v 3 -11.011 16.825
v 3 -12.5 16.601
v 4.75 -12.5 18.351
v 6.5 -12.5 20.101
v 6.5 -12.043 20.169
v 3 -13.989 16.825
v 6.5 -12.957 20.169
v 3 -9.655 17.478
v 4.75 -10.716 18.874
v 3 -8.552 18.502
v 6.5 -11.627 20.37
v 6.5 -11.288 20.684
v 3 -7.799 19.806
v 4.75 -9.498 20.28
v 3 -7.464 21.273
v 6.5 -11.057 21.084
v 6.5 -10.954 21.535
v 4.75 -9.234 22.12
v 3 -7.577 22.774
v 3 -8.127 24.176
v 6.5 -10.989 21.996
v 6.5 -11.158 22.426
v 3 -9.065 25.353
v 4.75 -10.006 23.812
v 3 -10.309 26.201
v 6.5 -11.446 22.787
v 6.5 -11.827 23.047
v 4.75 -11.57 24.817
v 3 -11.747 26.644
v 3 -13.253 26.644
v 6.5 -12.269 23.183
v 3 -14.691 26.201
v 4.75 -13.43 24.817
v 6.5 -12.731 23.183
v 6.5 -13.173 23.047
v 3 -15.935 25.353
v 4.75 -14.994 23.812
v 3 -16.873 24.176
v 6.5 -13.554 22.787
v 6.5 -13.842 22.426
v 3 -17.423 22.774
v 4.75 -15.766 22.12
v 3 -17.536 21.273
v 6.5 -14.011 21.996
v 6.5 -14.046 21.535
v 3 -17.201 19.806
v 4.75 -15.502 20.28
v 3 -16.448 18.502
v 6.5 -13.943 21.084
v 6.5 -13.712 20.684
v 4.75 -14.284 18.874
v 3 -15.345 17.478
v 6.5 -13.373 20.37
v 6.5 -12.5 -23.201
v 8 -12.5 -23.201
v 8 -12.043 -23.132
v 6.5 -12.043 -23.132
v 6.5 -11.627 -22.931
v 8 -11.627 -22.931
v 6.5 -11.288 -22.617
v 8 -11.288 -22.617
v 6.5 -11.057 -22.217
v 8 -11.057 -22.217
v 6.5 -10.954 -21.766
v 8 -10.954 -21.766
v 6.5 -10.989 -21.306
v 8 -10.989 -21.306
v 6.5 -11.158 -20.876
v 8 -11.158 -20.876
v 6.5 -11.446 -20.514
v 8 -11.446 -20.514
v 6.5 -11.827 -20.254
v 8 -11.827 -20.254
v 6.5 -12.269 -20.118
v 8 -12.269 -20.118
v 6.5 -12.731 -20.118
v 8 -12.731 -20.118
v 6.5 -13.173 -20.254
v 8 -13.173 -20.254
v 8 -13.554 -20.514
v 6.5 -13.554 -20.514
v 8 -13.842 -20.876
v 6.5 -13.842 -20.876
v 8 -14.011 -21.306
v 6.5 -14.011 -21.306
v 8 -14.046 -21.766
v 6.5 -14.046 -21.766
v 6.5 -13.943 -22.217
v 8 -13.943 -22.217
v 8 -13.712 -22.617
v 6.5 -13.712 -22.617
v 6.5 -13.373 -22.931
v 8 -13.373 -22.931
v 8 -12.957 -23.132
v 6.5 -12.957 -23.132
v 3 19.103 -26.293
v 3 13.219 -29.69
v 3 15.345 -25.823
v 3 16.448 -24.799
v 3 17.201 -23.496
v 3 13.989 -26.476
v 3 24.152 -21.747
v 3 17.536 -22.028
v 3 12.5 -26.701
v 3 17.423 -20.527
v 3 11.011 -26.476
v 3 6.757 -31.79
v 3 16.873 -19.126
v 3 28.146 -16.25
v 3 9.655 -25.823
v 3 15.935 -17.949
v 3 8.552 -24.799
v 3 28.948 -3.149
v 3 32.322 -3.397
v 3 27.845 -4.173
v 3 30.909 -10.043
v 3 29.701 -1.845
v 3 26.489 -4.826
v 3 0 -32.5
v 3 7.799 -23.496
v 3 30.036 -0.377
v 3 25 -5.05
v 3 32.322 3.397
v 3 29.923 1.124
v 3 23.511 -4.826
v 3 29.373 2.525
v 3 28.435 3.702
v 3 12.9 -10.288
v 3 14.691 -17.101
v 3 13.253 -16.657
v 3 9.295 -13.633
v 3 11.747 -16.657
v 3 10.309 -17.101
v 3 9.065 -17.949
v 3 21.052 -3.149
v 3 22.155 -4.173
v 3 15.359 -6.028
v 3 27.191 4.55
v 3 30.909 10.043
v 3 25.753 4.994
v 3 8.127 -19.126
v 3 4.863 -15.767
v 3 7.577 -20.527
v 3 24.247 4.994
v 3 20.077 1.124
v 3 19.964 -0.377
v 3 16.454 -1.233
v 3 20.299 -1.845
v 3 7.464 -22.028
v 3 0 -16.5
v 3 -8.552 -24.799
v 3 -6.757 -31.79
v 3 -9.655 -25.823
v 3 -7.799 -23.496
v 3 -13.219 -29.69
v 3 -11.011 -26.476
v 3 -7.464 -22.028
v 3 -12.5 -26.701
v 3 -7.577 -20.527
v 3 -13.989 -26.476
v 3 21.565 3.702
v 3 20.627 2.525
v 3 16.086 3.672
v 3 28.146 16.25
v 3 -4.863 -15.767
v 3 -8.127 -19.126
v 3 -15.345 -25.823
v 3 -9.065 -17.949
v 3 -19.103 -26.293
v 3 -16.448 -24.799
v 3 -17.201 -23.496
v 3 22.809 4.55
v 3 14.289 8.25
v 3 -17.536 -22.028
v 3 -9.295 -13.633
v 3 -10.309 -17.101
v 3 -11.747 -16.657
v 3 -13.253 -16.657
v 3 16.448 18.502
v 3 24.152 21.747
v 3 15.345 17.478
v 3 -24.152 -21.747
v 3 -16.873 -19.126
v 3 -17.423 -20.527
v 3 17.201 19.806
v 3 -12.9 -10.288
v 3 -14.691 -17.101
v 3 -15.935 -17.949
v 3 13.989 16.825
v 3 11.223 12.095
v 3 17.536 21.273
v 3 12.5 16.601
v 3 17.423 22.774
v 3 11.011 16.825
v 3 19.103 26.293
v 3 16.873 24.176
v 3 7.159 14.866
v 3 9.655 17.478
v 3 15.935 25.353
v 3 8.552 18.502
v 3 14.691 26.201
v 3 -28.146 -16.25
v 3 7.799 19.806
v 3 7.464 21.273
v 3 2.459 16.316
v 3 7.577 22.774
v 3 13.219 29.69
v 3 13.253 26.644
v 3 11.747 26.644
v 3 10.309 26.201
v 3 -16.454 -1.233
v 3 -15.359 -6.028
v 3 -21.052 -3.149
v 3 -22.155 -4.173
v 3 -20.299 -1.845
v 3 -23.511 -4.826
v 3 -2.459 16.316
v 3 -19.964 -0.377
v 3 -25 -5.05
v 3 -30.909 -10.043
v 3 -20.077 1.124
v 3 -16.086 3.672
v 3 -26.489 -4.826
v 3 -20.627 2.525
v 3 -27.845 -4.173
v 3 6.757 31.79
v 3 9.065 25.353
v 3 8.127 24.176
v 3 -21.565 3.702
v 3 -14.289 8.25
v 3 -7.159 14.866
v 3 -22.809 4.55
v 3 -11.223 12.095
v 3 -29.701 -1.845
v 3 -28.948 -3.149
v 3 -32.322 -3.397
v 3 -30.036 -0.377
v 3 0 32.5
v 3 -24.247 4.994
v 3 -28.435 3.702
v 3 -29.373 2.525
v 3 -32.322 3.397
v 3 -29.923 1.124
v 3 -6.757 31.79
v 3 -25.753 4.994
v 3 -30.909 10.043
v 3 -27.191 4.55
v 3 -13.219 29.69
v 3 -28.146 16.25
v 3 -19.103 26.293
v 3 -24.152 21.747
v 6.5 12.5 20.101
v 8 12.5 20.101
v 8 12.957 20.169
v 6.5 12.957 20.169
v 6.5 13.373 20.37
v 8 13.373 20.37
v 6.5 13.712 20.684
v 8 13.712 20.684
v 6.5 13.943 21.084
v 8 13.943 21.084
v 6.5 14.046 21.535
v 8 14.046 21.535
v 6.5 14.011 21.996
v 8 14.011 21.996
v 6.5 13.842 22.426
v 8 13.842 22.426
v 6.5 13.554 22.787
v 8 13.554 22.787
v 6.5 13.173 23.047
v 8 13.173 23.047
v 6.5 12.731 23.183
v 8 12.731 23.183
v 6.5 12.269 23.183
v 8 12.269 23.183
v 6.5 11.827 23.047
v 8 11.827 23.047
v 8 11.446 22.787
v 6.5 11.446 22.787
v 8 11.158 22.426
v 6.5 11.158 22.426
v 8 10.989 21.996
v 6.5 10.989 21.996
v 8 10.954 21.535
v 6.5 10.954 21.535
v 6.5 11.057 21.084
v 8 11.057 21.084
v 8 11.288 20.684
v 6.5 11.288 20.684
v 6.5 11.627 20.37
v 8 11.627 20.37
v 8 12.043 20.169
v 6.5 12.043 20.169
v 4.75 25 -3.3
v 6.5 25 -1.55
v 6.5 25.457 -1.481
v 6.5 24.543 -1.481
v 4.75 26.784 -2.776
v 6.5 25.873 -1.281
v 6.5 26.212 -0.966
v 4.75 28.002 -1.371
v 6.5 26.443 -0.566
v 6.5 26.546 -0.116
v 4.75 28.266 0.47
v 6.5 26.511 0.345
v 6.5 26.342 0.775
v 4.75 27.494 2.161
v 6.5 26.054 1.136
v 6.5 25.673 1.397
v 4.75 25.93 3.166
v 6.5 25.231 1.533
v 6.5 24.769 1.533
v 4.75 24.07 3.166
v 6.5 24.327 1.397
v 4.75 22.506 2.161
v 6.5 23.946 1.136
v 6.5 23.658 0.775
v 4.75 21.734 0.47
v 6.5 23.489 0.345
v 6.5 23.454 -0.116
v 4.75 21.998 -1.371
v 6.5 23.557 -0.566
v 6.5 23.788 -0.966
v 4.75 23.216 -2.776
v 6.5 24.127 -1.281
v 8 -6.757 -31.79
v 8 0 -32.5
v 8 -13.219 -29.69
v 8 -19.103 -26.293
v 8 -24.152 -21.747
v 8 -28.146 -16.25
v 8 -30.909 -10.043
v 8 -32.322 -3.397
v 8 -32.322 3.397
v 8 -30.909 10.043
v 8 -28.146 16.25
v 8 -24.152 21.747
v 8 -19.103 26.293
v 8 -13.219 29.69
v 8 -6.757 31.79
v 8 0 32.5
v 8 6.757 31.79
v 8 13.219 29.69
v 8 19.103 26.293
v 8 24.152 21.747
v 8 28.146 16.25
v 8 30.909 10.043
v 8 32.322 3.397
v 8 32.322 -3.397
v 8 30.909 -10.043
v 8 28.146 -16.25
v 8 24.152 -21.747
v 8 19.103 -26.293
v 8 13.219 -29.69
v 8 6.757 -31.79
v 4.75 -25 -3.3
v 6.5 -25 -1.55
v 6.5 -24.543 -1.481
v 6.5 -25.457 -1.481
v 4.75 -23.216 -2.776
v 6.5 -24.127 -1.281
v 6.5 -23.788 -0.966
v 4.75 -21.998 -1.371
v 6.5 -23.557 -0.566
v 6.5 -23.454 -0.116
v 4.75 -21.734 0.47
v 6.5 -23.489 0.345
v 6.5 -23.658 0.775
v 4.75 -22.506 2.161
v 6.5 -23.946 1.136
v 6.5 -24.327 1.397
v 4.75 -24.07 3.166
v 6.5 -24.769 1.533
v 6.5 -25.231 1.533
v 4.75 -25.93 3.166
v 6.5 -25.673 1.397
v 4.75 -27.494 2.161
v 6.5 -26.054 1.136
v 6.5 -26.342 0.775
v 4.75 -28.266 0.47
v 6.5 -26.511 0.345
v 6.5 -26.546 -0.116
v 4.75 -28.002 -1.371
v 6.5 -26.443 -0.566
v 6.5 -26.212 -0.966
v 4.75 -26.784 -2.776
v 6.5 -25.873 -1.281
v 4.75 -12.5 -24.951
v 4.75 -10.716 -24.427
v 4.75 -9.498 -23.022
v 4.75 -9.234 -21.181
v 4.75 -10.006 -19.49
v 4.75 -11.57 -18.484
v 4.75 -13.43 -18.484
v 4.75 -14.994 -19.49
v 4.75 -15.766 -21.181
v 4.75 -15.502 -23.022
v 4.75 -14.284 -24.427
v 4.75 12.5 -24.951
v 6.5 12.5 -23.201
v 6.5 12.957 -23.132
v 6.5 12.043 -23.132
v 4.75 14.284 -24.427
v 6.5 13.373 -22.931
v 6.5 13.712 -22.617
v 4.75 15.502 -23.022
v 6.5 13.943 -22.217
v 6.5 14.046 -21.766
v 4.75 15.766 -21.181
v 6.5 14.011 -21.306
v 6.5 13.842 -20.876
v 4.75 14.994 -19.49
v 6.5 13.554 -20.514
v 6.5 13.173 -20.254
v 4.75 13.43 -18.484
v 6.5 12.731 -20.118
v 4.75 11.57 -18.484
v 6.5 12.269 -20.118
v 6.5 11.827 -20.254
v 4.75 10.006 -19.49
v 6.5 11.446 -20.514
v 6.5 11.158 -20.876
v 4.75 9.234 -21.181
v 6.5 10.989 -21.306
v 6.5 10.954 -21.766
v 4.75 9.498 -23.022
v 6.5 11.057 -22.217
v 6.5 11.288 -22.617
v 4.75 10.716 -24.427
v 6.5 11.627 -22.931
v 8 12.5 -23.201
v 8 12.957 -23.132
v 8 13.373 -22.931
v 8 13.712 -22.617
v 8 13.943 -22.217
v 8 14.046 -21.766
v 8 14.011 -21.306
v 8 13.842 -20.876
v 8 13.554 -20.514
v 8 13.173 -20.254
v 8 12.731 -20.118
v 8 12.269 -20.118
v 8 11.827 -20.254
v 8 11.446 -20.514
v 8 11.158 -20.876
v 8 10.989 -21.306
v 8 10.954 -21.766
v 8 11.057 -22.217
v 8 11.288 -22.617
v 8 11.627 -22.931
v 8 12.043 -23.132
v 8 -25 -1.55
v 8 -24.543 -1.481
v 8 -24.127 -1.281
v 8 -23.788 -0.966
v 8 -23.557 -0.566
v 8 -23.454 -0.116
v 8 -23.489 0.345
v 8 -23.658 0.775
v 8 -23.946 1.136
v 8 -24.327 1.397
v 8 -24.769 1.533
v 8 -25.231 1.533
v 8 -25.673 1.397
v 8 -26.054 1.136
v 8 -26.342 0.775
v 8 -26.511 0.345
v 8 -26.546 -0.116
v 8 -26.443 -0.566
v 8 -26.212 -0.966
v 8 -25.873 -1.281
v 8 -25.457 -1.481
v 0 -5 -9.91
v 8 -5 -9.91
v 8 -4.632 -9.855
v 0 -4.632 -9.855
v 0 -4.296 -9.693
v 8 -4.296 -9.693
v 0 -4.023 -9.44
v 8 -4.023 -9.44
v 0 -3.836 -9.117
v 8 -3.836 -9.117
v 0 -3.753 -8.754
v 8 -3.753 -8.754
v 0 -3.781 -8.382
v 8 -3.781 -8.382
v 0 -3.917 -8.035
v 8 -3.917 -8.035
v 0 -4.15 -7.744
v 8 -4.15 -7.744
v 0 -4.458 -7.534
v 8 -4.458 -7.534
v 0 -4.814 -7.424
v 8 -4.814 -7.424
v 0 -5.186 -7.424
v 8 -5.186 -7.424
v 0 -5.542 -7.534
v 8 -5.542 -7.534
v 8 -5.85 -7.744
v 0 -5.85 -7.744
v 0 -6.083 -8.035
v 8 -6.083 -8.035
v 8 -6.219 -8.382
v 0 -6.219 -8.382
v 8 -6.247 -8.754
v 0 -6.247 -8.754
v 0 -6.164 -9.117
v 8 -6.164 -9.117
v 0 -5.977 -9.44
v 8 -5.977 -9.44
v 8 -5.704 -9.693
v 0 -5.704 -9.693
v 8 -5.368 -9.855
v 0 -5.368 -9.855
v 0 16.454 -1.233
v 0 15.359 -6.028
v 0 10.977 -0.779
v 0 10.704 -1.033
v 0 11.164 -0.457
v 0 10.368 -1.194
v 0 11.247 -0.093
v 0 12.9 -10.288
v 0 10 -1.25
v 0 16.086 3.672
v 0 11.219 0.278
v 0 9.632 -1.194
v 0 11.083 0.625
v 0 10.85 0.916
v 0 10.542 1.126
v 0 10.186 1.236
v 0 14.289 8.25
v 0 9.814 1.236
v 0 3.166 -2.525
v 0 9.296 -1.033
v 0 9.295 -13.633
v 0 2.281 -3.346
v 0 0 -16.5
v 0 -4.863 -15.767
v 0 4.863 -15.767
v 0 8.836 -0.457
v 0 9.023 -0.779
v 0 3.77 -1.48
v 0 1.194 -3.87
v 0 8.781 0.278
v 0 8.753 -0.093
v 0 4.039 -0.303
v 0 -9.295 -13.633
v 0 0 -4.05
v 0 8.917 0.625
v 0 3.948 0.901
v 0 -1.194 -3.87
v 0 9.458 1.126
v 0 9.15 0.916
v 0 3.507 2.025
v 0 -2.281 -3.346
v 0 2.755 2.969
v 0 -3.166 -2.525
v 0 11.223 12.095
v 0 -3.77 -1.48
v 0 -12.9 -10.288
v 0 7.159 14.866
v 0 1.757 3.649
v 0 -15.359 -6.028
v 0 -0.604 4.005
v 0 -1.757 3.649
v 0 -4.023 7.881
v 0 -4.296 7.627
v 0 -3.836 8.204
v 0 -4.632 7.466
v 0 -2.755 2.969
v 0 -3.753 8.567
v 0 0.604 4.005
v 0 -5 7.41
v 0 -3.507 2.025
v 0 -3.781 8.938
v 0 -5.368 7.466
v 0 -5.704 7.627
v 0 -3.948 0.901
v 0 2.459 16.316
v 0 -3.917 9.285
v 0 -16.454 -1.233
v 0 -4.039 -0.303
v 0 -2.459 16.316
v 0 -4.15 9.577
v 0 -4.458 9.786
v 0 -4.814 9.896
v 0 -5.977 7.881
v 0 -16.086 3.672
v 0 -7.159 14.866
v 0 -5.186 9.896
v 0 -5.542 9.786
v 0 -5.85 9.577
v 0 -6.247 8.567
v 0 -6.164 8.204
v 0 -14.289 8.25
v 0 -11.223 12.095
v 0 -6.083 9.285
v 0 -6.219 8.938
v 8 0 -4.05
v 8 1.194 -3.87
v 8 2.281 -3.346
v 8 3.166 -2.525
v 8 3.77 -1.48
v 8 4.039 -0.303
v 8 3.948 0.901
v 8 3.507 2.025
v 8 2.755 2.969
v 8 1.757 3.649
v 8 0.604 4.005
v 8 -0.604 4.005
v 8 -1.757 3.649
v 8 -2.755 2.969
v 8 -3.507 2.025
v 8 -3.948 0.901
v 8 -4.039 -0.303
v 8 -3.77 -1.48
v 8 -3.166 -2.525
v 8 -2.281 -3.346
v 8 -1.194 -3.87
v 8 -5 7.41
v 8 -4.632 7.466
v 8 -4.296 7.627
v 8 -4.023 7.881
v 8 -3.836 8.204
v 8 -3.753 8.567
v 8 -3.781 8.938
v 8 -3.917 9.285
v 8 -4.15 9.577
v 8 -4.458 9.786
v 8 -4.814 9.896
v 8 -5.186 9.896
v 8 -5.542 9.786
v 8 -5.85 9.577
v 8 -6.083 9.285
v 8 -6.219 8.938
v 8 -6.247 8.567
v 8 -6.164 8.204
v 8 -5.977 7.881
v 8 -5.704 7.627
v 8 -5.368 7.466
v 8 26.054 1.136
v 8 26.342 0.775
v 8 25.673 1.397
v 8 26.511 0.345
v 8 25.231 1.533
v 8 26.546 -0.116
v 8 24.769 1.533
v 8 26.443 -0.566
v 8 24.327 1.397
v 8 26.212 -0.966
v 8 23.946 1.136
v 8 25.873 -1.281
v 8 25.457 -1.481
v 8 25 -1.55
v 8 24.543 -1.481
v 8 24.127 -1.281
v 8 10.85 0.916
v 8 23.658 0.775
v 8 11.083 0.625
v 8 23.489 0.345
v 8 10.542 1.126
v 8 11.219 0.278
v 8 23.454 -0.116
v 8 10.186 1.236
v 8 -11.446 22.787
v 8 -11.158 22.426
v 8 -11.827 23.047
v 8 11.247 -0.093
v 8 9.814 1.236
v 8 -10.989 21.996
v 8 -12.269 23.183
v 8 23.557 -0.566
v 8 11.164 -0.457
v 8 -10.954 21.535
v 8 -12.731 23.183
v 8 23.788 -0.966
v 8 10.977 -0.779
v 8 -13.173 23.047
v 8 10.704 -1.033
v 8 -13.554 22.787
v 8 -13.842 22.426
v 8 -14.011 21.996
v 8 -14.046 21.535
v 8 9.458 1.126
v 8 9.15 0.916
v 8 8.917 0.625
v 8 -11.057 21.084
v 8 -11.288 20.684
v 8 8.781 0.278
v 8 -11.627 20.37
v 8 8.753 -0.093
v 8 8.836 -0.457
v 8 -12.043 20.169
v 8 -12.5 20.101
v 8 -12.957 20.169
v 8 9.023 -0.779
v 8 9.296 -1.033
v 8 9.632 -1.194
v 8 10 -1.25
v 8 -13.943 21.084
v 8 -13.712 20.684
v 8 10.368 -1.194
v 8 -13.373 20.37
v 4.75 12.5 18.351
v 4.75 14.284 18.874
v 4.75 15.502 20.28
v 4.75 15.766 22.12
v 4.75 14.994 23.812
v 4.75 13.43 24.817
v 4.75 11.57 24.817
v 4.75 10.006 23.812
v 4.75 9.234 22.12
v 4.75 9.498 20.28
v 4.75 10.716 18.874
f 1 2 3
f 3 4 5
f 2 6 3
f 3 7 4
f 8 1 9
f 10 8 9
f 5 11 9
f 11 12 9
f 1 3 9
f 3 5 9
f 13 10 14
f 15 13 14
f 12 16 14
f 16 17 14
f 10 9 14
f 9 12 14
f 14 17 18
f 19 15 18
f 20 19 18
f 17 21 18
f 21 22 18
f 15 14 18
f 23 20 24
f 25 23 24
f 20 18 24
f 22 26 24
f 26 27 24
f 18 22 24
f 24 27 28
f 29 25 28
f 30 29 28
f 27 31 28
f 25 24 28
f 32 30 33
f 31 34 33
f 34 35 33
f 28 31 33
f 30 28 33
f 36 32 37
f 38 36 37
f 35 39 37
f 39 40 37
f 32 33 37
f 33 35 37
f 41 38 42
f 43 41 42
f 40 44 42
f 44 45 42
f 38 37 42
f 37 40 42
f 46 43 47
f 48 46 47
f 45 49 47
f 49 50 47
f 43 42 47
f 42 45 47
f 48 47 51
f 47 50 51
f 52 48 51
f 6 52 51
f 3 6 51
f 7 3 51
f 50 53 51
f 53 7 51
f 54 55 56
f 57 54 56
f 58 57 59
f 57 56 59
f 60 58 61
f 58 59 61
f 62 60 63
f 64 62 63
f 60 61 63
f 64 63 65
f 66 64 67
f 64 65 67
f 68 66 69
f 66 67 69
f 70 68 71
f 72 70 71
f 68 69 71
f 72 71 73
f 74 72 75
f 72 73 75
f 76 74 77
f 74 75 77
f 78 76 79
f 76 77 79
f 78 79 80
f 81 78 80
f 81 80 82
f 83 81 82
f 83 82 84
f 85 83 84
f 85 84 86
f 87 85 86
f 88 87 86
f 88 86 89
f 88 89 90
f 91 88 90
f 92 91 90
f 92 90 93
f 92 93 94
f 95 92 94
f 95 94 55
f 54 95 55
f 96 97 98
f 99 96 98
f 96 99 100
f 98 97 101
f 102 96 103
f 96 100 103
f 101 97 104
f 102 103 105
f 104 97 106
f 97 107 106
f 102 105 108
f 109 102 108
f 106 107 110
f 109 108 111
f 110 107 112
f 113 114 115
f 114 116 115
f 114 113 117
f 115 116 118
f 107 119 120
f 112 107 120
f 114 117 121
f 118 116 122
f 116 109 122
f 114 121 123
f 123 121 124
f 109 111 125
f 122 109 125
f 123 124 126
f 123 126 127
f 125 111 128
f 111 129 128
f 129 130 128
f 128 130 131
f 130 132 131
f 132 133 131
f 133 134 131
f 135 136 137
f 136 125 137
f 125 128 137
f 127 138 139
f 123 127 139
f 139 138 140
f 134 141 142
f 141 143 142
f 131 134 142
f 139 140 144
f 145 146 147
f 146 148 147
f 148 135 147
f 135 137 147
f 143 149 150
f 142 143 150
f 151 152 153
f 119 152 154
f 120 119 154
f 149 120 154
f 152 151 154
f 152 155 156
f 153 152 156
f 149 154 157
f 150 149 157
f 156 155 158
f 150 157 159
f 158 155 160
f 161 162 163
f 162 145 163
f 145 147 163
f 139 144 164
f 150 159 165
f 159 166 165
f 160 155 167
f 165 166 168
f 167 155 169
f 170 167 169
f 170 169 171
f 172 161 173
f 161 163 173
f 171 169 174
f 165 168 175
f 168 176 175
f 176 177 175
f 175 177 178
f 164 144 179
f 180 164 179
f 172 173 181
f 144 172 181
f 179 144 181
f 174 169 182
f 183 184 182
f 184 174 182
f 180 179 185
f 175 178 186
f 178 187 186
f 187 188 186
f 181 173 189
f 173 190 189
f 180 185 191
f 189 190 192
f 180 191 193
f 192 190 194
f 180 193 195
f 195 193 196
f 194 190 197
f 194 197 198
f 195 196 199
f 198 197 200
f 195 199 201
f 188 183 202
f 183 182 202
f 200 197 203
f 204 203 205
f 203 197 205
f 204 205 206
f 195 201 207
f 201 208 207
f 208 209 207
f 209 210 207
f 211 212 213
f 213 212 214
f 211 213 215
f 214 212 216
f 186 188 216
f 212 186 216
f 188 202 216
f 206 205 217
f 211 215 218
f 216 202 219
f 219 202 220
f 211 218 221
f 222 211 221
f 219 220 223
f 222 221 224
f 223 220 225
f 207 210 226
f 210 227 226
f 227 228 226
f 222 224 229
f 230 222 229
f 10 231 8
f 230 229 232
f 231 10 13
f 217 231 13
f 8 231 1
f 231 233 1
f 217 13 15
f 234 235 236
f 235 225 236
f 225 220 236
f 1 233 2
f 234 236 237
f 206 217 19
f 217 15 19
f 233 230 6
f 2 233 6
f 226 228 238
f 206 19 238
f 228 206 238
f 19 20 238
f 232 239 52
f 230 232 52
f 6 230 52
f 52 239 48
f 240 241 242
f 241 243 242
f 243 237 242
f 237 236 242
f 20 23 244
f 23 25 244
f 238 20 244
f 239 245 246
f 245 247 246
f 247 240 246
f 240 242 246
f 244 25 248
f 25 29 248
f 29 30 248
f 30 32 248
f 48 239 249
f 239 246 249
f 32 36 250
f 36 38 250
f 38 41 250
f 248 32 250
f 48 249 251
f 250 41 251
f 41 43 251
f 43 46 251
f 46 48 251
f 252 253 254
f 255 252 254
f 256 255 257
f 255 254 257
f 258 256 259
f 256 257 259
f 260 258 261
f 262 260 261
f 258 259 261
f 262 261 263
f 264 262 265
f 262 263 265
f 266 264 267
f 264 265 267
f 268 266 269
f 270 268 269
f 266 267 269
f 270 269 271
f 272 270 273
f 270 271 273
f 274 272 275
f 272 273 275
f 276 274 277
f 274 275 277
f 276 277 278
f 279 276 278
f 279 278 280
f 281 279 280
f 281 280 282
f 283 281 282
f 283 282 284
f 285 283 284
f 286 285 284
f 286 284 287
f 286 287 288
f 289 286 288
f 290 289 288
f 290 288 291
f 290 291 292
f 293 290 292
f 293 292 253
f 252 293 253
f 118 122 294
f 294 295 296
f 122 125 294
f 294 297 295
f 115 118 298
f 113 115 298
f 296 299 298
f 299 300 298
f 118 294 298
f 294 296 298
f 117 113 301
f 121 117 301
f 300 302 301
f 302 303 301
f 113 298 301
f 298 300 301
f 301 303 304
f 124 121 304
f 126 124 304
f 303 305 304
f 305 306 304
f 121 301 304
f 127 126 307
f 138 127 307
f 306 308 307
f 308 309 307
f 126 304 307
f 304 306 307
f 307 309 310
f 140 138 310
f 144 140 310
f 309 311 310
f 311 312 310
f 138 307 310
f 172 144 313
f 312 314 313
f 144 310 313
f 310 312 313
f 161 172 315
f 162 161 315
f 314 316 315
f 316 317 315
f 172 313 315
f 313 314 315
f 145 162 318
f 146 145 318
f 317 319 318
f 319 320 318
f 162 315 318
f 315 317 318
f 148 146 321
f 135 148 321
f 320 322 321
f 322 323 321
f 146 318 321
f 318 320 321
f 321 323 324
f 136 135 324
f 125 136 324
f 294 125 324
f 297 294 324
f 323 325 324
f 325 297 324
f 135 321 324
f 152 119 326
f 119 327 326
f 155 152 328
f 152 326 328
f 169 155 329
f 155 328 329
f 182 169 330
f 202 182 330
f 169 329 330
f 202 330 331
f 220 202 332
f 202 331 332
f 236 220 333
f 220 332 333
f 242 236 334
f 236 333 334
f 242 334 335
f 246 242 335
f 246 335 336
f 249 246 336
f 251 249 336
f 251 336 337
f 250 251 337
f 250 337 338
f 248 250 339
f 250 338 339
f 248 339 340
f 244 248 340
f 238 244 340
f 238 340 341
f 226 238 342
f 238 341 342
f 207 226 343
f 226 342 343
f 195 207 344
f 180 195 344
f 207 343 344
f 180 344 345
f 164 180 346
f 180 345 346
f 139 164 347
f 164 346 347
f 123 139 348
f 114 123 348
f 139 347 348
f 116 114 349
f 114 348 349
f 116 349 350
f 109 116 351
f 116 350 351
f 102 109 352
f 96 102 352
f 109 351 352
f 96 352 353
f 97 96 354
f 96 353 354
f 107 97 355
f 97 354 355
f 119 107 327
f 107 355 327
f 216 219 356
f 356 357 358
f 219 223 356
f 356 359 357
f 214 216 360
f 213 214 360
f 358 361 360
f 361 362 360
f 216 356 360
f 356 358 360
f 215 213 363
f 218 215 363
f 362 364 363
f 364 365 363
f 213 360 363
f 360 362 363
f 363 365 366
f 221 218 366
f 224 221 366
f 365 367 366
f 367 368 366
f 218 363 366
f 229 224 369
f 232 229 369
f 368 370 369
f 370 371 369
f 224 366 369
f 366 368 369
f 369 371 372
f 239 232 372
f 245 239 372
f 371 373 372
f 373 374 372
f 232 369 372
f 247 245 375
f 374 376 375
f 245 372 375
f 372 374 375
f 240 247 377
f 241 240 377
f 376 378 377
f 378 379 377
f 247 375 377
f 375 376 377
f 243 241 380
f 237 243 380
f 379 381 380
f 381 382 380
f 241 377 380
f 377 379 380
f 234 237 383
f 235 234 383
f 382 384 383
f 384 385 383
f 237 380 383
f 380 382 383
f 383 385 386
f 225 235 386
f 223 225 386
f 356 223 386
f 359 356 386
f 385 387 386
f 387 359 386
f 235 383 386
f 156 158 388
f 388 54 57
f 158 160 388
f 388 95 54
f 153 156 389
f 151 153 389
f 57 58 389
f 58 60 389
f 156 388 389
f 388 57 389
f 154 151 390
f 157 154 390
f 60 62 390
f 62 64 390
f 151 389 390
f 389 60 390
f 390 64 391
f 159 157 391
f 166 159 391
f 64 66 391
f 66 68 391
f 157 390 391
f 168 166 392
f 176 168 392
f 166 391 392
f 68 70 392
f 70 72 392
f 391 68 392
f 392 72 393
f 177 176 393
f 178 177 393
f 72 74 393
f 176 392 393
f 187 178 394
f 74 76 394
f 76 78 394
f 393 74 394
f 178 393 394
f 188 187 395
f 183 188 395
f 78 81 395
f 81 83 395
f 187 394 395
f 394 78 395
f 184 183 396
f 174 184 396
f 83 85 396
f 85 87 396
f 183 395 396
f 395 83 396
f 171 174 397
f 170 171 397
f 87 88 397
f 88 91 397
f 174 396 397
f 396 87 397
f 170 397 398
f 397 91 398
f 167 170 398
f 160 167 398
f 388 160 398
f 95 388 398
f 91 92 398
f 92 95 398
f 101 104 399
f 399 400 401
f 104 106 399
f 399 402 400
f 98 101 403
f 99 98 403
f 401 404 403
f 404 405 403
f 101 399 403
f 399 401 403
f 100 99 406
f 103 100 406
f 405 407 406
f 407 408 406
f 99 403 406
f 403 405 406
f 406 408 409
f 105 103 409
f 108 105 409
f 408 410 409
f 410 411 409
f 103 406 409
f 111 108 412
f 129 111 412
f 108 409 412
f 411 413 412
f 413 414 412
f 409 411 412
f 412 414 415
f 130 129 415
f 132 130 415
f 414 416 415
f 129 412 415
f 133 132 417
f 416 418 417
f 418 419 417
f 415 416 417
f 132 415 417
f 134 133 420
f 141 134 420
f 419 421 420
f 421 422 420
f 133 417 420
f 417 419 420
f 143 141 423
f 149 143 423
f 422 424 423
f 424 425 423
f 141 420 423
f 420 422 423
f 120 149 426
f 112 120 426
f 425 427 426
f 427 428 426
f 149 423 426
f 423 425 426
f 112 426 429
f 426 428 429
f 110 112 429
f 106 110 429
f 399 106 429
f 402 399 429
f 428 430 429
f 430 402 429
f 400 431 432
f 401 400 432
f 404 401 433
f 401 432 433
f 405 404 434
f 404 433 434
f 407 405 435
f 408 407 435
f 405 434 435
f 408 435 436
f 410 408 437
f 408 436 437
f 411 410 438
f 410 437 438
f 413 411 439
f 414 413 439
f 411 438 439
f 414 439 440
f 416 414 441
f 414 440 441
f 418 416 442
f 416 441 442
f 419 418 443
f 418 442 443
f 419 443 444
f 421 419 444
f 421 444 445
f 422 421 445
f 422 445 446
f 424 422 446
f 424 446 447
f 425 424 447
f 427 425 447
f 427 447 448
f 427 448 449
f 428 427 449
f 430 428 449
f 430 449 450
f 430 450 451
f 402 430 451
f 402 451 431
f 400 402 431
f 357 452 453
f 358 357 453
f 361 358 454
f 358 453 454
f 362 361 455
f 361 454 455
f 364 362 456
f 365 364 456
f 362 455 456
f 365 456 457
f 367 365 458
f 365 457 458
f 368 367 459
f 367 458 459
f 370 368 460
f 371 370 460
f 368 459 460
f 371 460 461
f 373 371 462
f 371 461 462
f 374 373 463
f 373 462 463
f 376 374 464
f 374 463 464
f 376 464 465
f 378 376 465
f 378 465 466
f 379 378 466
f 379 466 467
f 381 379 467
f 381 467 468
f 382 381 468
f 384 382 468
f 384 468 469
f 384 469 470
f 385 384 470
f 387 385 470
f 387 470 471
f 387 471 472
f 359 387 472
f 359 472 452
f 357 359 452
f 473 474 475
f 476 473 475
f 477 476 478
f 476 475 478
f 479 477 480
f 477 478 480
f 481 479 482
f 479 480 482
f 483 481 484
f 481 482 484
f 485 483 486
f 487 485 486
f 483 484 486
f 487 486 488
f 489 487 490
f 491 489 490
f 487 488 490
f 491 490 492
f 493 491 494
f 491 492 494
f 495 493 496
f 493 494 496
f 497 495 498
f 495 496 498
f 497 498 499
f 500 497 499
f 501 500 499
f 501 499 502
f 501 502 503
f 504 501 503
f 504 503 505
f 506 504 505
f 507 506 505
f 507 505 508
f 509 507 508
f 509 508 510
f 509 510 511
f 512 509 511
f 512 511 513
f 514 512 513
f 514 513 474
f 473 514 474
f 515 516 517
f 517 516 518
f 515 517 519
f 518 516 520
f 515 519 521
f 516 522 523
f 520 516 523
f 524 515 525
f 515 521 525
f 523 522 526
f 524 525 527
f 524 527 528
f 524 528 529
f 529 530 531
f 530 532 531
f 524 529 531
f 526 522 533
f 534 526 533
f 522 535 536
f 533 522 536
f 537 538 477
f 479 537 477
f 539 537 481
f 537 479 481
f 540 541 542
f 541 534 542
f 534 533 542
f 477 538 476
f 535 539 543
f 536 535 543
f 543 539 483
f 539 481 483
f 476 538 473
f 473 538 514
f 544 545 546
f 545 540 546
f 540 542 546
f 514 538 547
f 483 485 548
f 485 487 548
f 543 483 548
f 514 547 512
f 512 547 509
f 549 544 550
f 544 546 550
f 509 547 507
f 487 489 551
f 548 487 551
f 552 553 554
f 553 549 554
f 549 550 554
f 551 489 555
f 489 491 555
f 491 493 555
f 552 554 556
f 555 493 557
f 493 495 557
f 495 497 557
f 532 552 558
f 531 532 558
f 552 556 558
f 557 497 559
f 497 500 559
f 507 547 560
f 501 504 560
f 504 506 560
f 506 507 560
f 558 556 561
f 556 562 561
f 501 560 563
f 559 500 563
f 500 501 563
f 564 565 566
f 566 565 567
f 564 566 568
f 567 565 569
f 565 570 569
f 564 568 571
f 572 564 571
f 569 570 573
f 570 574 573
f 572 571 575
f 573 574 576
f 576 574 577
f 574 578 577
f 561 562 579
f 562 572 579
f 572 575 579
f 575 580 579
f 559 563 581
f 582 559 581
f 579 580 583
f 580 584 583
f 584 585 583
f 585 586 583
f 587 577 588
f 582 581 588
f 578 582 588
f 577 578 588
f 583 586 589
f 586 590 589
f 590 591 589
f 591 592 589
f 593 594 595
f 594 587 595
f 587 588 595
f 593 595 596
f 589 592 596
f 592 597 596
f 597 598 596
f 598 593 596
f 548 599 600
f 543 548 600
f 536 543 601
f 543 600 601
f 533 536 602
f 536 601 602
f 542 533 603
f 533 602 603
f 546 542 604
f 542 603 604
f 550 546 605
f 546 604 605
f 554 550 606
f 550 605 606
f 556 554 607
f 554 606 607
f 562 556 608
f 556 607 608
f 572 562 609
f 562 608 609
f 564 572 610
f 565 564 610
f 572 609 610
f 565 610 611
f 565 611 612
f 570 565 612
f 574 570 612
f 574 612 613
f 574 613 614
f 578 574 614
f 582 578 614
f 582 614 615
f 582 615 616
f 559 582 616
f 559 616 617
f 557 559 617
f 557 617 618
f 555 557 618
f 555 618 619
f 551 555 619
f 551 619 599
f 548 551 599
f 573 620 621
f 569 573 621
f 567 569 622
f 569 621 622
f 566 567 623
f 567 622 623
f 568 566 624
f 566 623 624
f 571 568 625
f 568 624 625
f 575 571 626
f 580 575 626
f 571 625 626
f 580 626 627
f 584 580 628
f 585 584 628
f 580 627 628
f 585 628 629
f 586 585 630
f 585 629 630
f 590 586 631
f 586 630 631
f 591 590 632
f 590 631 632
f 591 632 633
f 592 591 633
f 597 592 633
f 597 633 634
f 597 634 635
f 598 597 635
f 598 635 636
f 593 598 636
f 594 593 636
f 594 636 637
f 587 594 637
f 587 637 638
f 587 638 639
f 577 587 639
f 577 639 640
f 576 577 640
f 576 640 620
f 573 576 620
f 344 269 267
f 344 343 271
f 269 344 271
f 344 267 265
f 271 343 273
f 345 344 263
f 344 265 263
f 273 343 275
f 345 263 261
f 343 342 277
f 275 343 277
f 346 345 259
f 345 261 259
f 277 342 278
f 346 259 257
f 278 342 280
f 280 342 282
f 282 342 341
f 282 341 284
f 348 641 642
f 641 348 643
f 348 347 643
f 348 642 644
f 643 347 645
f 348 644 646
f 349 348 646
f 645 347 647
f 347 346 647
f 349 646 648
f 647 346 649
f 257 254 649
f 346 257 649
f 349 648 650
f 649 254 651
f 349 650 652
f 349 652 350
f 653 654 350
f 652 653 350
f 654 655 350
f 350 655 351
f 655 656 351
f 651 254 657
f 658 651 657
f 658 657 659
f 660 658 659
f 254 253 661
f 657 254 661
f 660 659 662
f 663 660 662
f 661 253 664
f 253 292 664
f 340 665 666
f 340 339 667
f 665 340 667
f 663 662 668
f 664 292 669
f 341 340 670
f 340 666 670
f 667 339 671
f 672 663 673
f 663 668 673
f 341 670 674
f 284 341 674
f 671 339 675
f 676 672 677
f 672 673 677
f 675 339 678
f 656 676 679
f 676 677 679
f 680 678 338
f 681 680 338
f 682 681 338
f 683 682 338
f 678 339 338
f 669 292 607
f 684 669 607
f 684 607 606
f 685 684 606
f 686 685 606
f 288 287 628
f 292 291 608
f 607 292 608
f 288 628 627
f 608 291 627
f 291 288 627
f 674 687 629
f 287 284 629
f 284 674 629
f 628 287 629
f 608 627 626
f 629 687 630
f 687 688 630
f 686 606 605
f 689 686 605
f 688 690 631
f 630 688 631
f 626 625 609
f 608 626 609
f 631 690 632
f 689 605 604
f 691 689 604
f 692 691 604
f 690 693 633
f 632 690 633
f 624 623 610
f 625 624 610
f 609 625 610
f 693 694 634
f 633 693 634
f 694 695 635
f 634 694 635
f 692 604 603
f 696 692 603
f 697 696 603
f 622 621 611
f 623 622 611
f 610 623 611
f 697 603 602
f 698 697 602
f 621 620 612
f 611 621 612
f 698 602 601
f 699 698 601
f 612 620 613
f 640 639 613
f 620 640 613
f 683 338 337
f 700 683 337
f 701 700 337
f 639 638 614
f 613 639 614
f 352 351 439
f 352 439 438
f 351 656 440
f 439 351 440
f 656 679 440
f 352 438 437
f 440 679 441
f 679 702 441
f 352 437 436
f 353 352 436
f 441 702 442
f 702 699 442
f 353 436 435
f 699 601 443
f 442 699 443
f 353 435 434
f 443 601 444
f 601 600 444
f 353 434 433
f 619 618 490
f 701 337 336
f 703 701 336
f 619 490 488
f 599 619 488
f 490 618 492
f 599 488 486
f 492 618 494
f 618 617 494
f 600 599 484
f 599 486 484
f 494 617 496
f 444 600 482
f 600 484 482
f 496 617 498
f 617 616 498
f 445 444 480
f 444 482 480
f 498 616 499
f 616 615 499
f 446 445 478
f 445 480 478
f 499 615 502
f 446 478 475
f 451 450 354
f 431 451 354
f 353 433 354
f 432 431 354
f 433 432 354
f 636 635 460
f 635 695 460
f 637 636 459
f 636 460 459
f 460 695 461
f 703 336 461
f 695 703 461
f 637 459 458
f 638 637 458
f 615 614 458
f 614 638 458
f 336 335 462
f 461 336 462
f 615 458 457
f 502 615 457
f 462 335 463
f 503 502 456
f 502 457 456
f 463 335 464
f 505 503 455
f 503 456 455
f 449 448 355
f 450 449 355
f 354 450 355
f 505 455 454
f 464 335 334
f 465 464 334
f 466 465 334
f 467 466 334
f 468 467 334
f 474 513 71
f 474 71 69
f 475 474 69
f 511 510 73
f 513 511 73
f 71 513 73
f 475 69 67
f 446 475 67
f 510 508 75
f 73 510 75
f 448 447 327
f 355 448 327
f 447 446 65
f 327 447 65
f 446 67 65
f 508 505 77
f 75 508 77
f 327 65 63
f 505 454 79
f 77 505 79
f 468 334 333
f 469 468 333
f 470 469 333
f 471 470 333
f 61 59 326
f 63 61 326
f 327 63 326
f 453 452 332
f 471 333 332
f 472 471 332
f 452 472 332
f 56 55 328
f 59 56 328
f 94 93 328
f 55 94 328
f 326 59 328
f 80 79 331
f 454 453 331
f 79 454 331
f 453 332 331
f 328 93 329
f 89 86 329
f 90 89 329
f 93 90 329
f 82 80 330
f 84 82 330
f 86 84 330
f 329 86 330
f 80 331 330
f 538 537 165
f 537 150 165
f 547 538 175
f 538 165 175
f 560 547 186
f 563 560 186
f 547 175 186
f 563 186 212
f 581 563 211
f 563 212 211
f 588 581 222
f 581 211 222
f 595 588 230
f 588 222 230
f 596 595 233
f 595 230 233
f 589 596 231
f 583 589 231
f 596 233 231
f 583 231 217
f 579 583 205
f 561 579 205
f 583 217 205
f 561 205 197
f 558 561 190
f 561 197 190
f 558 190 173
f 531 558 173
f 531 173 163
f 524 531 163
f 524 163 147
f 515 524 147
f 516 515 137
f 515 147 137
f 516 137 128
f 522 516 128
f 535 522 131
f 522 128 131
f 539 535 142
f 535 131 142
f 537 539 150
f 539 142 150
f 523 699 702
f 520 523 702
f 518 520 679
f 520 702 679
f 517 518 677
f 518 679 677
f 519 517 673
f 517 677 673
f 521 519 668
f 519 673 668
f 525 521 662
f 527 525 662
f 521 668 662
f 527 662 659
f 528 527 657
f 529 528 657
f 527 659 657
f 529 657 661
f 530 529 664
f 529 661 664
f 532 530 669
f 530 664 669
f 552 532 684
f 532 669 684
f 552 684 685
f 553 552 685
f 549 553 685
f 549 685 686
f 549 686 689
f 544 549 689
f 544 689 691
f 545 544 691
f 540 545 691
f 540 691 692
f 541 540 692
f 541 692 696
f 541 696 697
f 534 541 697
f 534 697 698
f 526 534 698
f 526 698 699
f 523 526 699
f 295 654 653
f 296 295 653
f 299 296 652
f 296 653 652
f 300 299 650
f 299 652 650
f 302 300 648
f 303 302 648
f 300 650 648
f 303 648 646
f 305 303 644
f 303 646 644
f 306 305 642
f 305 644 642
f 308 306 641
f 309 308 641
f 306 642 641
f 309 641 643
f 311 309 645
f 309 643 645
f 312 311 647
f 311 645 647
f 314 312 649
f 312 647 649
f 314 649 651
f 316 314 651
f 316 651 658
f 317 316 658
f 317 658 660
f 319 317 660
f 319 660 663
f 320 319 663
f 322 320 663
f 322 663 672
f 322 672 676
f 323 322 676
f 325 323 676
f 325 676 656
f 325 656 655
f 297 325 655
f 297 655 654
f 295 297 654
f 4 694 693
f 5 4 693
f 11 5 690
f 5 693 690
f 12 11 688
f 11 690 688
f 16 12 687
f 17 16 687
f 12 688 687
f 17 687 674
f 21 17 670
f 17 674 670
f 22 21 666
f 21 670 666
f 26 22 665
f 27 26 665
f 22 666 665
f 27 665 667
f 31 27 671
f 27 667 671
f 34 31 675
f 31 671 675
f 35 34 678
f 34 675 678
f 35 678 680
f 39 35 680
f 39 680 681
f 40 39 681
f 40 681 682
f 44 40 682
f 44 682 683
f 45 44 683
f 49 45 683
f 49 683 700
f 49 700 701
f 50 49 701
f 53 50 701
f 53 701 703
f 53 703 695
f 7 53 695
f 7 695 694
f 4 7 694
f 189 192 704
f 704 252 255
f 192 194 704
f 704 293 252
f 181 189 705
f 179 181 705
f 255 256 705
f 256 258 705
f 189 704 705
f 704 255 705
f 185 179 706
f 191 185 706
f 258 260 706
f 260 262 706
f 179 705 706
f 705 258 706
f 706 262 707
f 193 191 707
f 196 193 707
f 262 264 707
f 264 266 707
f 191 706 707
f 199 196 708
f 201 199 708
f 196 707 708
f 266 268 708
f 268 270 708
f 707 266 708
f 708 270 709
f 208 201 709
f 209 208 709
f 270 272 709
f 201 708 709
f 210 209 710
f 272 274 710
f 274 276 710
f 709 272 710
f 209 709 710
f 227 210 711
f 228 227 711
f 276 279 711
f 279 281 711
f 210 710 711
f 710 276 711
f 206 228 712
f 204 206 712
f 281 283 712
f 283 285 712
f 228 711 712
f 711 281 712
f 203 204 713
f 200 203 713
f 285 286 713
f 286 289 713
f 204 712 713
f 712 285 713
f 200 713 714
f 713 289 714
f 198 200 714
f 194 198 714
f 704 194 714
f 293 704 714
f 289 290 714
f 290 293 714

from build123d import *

# Parameters (mm, degrees)
F_8_1_8_1_DURCHMESSER_BOHRUNG1_D = 8.1
SKIZZE4_R                        = 1.25
SCHNITT_LINEAR_AUSTRAGEN1_DEPTH  = 47.652974182
SKIZZE5_R                        = 1.55
SCHNITT_LINEAR_AUSTRAGEN2_DEPTH  = 47.652974182
FASE2_SIZE                       = 3.5


with BuildPart() as part:
    # Skizze1 → Rotation1 (revolve)
    with BuildSketch(Plane.XY, mode=Mode.PRIVATE) as rotation1_sk:
        Polygon((0, 0), (0, 16.5), (3, 16.5), (3, 32.5), (8, 32.5), (8, 0), align=None)
    revolve(rotation1_sk.sketch.rotate(Axis((0, 0, 0), (-1, 0, 0)), 90), axis=Axis((0, 0, 0), (-1, 0, 0)))

    # Ø8.1 (8.1) Durchmesser Bohrung1 (through all)
    with Locations(Plane.ZY):
        with Locations((0, 0)):
            Hole(F_8_1_8_1_DURCHMESSER_BOHRUNG1_D / 2)

    # Skizze4 → Schnitt-Linear austragen1 (cut, through all)
    with BuildSketch(Plane(origin=(8, 0, 0), x_dir=(0, 0, -1), z_dir=(1, 0, 0))):
        with Locations((0, 10)):
            Circle(SKIZZE4_R)
        with Locations((8.660254038, -5)):
            Circle(SKIZZE4_R)
        with Locations((-8.660254038, -5)):
            Circle(SKIZZE4_R)
    extrude(amount=-SCHNITT_LINEAR_AUSTRAGEN1_DEPTH, mode=Mode.SUBTRACT)

    # Skizze5 → Schnitt-Linear austragen2 (cut, through all)
    with BuildSketch(Plane(origin=(8, 0, 0), x_dir=(0, 0, -1), z_dir=(1, 0, 0))):
        with Locations((0, 25)):
            Circle(SKIZZE5_R)
        with Locations((21.650635095, 12.5)):
            Circle(SKIZZE5_R)
        with Locations((21.650635095, -12.5)):
            Circle(SKIZZE5_R)
        with Locations((0, -25)):
            Circle(SKIZZE5_R)
        with Locations((-21.650635095, -12.5)):
            Circle(SKIZZE5_R)
        with Locations((-21.650635095, 12.5)):
            Circle(SKIZZE5_R)
    extrude(amount=-SCHNITT_LINEAR_AUSTRAGEN2_DEPTH, mode=Mode.SUBTRACT)

    # Fase2
    fase2_edges = [part.edges().sort_by_distance(p)[0] for p in [
        (3, 25, 1.55),
        (3, 12.5, 23.200635095),
        (3, -12.5, 23.200635095),
        (3, -25, 1.55),
        (3, -12.5, -20.100635095),
        (3, 12.5, -20.100635095),
    ]]
    chamfer(fase2_edges, length=FASE2_SIZE)


solid = part.part
